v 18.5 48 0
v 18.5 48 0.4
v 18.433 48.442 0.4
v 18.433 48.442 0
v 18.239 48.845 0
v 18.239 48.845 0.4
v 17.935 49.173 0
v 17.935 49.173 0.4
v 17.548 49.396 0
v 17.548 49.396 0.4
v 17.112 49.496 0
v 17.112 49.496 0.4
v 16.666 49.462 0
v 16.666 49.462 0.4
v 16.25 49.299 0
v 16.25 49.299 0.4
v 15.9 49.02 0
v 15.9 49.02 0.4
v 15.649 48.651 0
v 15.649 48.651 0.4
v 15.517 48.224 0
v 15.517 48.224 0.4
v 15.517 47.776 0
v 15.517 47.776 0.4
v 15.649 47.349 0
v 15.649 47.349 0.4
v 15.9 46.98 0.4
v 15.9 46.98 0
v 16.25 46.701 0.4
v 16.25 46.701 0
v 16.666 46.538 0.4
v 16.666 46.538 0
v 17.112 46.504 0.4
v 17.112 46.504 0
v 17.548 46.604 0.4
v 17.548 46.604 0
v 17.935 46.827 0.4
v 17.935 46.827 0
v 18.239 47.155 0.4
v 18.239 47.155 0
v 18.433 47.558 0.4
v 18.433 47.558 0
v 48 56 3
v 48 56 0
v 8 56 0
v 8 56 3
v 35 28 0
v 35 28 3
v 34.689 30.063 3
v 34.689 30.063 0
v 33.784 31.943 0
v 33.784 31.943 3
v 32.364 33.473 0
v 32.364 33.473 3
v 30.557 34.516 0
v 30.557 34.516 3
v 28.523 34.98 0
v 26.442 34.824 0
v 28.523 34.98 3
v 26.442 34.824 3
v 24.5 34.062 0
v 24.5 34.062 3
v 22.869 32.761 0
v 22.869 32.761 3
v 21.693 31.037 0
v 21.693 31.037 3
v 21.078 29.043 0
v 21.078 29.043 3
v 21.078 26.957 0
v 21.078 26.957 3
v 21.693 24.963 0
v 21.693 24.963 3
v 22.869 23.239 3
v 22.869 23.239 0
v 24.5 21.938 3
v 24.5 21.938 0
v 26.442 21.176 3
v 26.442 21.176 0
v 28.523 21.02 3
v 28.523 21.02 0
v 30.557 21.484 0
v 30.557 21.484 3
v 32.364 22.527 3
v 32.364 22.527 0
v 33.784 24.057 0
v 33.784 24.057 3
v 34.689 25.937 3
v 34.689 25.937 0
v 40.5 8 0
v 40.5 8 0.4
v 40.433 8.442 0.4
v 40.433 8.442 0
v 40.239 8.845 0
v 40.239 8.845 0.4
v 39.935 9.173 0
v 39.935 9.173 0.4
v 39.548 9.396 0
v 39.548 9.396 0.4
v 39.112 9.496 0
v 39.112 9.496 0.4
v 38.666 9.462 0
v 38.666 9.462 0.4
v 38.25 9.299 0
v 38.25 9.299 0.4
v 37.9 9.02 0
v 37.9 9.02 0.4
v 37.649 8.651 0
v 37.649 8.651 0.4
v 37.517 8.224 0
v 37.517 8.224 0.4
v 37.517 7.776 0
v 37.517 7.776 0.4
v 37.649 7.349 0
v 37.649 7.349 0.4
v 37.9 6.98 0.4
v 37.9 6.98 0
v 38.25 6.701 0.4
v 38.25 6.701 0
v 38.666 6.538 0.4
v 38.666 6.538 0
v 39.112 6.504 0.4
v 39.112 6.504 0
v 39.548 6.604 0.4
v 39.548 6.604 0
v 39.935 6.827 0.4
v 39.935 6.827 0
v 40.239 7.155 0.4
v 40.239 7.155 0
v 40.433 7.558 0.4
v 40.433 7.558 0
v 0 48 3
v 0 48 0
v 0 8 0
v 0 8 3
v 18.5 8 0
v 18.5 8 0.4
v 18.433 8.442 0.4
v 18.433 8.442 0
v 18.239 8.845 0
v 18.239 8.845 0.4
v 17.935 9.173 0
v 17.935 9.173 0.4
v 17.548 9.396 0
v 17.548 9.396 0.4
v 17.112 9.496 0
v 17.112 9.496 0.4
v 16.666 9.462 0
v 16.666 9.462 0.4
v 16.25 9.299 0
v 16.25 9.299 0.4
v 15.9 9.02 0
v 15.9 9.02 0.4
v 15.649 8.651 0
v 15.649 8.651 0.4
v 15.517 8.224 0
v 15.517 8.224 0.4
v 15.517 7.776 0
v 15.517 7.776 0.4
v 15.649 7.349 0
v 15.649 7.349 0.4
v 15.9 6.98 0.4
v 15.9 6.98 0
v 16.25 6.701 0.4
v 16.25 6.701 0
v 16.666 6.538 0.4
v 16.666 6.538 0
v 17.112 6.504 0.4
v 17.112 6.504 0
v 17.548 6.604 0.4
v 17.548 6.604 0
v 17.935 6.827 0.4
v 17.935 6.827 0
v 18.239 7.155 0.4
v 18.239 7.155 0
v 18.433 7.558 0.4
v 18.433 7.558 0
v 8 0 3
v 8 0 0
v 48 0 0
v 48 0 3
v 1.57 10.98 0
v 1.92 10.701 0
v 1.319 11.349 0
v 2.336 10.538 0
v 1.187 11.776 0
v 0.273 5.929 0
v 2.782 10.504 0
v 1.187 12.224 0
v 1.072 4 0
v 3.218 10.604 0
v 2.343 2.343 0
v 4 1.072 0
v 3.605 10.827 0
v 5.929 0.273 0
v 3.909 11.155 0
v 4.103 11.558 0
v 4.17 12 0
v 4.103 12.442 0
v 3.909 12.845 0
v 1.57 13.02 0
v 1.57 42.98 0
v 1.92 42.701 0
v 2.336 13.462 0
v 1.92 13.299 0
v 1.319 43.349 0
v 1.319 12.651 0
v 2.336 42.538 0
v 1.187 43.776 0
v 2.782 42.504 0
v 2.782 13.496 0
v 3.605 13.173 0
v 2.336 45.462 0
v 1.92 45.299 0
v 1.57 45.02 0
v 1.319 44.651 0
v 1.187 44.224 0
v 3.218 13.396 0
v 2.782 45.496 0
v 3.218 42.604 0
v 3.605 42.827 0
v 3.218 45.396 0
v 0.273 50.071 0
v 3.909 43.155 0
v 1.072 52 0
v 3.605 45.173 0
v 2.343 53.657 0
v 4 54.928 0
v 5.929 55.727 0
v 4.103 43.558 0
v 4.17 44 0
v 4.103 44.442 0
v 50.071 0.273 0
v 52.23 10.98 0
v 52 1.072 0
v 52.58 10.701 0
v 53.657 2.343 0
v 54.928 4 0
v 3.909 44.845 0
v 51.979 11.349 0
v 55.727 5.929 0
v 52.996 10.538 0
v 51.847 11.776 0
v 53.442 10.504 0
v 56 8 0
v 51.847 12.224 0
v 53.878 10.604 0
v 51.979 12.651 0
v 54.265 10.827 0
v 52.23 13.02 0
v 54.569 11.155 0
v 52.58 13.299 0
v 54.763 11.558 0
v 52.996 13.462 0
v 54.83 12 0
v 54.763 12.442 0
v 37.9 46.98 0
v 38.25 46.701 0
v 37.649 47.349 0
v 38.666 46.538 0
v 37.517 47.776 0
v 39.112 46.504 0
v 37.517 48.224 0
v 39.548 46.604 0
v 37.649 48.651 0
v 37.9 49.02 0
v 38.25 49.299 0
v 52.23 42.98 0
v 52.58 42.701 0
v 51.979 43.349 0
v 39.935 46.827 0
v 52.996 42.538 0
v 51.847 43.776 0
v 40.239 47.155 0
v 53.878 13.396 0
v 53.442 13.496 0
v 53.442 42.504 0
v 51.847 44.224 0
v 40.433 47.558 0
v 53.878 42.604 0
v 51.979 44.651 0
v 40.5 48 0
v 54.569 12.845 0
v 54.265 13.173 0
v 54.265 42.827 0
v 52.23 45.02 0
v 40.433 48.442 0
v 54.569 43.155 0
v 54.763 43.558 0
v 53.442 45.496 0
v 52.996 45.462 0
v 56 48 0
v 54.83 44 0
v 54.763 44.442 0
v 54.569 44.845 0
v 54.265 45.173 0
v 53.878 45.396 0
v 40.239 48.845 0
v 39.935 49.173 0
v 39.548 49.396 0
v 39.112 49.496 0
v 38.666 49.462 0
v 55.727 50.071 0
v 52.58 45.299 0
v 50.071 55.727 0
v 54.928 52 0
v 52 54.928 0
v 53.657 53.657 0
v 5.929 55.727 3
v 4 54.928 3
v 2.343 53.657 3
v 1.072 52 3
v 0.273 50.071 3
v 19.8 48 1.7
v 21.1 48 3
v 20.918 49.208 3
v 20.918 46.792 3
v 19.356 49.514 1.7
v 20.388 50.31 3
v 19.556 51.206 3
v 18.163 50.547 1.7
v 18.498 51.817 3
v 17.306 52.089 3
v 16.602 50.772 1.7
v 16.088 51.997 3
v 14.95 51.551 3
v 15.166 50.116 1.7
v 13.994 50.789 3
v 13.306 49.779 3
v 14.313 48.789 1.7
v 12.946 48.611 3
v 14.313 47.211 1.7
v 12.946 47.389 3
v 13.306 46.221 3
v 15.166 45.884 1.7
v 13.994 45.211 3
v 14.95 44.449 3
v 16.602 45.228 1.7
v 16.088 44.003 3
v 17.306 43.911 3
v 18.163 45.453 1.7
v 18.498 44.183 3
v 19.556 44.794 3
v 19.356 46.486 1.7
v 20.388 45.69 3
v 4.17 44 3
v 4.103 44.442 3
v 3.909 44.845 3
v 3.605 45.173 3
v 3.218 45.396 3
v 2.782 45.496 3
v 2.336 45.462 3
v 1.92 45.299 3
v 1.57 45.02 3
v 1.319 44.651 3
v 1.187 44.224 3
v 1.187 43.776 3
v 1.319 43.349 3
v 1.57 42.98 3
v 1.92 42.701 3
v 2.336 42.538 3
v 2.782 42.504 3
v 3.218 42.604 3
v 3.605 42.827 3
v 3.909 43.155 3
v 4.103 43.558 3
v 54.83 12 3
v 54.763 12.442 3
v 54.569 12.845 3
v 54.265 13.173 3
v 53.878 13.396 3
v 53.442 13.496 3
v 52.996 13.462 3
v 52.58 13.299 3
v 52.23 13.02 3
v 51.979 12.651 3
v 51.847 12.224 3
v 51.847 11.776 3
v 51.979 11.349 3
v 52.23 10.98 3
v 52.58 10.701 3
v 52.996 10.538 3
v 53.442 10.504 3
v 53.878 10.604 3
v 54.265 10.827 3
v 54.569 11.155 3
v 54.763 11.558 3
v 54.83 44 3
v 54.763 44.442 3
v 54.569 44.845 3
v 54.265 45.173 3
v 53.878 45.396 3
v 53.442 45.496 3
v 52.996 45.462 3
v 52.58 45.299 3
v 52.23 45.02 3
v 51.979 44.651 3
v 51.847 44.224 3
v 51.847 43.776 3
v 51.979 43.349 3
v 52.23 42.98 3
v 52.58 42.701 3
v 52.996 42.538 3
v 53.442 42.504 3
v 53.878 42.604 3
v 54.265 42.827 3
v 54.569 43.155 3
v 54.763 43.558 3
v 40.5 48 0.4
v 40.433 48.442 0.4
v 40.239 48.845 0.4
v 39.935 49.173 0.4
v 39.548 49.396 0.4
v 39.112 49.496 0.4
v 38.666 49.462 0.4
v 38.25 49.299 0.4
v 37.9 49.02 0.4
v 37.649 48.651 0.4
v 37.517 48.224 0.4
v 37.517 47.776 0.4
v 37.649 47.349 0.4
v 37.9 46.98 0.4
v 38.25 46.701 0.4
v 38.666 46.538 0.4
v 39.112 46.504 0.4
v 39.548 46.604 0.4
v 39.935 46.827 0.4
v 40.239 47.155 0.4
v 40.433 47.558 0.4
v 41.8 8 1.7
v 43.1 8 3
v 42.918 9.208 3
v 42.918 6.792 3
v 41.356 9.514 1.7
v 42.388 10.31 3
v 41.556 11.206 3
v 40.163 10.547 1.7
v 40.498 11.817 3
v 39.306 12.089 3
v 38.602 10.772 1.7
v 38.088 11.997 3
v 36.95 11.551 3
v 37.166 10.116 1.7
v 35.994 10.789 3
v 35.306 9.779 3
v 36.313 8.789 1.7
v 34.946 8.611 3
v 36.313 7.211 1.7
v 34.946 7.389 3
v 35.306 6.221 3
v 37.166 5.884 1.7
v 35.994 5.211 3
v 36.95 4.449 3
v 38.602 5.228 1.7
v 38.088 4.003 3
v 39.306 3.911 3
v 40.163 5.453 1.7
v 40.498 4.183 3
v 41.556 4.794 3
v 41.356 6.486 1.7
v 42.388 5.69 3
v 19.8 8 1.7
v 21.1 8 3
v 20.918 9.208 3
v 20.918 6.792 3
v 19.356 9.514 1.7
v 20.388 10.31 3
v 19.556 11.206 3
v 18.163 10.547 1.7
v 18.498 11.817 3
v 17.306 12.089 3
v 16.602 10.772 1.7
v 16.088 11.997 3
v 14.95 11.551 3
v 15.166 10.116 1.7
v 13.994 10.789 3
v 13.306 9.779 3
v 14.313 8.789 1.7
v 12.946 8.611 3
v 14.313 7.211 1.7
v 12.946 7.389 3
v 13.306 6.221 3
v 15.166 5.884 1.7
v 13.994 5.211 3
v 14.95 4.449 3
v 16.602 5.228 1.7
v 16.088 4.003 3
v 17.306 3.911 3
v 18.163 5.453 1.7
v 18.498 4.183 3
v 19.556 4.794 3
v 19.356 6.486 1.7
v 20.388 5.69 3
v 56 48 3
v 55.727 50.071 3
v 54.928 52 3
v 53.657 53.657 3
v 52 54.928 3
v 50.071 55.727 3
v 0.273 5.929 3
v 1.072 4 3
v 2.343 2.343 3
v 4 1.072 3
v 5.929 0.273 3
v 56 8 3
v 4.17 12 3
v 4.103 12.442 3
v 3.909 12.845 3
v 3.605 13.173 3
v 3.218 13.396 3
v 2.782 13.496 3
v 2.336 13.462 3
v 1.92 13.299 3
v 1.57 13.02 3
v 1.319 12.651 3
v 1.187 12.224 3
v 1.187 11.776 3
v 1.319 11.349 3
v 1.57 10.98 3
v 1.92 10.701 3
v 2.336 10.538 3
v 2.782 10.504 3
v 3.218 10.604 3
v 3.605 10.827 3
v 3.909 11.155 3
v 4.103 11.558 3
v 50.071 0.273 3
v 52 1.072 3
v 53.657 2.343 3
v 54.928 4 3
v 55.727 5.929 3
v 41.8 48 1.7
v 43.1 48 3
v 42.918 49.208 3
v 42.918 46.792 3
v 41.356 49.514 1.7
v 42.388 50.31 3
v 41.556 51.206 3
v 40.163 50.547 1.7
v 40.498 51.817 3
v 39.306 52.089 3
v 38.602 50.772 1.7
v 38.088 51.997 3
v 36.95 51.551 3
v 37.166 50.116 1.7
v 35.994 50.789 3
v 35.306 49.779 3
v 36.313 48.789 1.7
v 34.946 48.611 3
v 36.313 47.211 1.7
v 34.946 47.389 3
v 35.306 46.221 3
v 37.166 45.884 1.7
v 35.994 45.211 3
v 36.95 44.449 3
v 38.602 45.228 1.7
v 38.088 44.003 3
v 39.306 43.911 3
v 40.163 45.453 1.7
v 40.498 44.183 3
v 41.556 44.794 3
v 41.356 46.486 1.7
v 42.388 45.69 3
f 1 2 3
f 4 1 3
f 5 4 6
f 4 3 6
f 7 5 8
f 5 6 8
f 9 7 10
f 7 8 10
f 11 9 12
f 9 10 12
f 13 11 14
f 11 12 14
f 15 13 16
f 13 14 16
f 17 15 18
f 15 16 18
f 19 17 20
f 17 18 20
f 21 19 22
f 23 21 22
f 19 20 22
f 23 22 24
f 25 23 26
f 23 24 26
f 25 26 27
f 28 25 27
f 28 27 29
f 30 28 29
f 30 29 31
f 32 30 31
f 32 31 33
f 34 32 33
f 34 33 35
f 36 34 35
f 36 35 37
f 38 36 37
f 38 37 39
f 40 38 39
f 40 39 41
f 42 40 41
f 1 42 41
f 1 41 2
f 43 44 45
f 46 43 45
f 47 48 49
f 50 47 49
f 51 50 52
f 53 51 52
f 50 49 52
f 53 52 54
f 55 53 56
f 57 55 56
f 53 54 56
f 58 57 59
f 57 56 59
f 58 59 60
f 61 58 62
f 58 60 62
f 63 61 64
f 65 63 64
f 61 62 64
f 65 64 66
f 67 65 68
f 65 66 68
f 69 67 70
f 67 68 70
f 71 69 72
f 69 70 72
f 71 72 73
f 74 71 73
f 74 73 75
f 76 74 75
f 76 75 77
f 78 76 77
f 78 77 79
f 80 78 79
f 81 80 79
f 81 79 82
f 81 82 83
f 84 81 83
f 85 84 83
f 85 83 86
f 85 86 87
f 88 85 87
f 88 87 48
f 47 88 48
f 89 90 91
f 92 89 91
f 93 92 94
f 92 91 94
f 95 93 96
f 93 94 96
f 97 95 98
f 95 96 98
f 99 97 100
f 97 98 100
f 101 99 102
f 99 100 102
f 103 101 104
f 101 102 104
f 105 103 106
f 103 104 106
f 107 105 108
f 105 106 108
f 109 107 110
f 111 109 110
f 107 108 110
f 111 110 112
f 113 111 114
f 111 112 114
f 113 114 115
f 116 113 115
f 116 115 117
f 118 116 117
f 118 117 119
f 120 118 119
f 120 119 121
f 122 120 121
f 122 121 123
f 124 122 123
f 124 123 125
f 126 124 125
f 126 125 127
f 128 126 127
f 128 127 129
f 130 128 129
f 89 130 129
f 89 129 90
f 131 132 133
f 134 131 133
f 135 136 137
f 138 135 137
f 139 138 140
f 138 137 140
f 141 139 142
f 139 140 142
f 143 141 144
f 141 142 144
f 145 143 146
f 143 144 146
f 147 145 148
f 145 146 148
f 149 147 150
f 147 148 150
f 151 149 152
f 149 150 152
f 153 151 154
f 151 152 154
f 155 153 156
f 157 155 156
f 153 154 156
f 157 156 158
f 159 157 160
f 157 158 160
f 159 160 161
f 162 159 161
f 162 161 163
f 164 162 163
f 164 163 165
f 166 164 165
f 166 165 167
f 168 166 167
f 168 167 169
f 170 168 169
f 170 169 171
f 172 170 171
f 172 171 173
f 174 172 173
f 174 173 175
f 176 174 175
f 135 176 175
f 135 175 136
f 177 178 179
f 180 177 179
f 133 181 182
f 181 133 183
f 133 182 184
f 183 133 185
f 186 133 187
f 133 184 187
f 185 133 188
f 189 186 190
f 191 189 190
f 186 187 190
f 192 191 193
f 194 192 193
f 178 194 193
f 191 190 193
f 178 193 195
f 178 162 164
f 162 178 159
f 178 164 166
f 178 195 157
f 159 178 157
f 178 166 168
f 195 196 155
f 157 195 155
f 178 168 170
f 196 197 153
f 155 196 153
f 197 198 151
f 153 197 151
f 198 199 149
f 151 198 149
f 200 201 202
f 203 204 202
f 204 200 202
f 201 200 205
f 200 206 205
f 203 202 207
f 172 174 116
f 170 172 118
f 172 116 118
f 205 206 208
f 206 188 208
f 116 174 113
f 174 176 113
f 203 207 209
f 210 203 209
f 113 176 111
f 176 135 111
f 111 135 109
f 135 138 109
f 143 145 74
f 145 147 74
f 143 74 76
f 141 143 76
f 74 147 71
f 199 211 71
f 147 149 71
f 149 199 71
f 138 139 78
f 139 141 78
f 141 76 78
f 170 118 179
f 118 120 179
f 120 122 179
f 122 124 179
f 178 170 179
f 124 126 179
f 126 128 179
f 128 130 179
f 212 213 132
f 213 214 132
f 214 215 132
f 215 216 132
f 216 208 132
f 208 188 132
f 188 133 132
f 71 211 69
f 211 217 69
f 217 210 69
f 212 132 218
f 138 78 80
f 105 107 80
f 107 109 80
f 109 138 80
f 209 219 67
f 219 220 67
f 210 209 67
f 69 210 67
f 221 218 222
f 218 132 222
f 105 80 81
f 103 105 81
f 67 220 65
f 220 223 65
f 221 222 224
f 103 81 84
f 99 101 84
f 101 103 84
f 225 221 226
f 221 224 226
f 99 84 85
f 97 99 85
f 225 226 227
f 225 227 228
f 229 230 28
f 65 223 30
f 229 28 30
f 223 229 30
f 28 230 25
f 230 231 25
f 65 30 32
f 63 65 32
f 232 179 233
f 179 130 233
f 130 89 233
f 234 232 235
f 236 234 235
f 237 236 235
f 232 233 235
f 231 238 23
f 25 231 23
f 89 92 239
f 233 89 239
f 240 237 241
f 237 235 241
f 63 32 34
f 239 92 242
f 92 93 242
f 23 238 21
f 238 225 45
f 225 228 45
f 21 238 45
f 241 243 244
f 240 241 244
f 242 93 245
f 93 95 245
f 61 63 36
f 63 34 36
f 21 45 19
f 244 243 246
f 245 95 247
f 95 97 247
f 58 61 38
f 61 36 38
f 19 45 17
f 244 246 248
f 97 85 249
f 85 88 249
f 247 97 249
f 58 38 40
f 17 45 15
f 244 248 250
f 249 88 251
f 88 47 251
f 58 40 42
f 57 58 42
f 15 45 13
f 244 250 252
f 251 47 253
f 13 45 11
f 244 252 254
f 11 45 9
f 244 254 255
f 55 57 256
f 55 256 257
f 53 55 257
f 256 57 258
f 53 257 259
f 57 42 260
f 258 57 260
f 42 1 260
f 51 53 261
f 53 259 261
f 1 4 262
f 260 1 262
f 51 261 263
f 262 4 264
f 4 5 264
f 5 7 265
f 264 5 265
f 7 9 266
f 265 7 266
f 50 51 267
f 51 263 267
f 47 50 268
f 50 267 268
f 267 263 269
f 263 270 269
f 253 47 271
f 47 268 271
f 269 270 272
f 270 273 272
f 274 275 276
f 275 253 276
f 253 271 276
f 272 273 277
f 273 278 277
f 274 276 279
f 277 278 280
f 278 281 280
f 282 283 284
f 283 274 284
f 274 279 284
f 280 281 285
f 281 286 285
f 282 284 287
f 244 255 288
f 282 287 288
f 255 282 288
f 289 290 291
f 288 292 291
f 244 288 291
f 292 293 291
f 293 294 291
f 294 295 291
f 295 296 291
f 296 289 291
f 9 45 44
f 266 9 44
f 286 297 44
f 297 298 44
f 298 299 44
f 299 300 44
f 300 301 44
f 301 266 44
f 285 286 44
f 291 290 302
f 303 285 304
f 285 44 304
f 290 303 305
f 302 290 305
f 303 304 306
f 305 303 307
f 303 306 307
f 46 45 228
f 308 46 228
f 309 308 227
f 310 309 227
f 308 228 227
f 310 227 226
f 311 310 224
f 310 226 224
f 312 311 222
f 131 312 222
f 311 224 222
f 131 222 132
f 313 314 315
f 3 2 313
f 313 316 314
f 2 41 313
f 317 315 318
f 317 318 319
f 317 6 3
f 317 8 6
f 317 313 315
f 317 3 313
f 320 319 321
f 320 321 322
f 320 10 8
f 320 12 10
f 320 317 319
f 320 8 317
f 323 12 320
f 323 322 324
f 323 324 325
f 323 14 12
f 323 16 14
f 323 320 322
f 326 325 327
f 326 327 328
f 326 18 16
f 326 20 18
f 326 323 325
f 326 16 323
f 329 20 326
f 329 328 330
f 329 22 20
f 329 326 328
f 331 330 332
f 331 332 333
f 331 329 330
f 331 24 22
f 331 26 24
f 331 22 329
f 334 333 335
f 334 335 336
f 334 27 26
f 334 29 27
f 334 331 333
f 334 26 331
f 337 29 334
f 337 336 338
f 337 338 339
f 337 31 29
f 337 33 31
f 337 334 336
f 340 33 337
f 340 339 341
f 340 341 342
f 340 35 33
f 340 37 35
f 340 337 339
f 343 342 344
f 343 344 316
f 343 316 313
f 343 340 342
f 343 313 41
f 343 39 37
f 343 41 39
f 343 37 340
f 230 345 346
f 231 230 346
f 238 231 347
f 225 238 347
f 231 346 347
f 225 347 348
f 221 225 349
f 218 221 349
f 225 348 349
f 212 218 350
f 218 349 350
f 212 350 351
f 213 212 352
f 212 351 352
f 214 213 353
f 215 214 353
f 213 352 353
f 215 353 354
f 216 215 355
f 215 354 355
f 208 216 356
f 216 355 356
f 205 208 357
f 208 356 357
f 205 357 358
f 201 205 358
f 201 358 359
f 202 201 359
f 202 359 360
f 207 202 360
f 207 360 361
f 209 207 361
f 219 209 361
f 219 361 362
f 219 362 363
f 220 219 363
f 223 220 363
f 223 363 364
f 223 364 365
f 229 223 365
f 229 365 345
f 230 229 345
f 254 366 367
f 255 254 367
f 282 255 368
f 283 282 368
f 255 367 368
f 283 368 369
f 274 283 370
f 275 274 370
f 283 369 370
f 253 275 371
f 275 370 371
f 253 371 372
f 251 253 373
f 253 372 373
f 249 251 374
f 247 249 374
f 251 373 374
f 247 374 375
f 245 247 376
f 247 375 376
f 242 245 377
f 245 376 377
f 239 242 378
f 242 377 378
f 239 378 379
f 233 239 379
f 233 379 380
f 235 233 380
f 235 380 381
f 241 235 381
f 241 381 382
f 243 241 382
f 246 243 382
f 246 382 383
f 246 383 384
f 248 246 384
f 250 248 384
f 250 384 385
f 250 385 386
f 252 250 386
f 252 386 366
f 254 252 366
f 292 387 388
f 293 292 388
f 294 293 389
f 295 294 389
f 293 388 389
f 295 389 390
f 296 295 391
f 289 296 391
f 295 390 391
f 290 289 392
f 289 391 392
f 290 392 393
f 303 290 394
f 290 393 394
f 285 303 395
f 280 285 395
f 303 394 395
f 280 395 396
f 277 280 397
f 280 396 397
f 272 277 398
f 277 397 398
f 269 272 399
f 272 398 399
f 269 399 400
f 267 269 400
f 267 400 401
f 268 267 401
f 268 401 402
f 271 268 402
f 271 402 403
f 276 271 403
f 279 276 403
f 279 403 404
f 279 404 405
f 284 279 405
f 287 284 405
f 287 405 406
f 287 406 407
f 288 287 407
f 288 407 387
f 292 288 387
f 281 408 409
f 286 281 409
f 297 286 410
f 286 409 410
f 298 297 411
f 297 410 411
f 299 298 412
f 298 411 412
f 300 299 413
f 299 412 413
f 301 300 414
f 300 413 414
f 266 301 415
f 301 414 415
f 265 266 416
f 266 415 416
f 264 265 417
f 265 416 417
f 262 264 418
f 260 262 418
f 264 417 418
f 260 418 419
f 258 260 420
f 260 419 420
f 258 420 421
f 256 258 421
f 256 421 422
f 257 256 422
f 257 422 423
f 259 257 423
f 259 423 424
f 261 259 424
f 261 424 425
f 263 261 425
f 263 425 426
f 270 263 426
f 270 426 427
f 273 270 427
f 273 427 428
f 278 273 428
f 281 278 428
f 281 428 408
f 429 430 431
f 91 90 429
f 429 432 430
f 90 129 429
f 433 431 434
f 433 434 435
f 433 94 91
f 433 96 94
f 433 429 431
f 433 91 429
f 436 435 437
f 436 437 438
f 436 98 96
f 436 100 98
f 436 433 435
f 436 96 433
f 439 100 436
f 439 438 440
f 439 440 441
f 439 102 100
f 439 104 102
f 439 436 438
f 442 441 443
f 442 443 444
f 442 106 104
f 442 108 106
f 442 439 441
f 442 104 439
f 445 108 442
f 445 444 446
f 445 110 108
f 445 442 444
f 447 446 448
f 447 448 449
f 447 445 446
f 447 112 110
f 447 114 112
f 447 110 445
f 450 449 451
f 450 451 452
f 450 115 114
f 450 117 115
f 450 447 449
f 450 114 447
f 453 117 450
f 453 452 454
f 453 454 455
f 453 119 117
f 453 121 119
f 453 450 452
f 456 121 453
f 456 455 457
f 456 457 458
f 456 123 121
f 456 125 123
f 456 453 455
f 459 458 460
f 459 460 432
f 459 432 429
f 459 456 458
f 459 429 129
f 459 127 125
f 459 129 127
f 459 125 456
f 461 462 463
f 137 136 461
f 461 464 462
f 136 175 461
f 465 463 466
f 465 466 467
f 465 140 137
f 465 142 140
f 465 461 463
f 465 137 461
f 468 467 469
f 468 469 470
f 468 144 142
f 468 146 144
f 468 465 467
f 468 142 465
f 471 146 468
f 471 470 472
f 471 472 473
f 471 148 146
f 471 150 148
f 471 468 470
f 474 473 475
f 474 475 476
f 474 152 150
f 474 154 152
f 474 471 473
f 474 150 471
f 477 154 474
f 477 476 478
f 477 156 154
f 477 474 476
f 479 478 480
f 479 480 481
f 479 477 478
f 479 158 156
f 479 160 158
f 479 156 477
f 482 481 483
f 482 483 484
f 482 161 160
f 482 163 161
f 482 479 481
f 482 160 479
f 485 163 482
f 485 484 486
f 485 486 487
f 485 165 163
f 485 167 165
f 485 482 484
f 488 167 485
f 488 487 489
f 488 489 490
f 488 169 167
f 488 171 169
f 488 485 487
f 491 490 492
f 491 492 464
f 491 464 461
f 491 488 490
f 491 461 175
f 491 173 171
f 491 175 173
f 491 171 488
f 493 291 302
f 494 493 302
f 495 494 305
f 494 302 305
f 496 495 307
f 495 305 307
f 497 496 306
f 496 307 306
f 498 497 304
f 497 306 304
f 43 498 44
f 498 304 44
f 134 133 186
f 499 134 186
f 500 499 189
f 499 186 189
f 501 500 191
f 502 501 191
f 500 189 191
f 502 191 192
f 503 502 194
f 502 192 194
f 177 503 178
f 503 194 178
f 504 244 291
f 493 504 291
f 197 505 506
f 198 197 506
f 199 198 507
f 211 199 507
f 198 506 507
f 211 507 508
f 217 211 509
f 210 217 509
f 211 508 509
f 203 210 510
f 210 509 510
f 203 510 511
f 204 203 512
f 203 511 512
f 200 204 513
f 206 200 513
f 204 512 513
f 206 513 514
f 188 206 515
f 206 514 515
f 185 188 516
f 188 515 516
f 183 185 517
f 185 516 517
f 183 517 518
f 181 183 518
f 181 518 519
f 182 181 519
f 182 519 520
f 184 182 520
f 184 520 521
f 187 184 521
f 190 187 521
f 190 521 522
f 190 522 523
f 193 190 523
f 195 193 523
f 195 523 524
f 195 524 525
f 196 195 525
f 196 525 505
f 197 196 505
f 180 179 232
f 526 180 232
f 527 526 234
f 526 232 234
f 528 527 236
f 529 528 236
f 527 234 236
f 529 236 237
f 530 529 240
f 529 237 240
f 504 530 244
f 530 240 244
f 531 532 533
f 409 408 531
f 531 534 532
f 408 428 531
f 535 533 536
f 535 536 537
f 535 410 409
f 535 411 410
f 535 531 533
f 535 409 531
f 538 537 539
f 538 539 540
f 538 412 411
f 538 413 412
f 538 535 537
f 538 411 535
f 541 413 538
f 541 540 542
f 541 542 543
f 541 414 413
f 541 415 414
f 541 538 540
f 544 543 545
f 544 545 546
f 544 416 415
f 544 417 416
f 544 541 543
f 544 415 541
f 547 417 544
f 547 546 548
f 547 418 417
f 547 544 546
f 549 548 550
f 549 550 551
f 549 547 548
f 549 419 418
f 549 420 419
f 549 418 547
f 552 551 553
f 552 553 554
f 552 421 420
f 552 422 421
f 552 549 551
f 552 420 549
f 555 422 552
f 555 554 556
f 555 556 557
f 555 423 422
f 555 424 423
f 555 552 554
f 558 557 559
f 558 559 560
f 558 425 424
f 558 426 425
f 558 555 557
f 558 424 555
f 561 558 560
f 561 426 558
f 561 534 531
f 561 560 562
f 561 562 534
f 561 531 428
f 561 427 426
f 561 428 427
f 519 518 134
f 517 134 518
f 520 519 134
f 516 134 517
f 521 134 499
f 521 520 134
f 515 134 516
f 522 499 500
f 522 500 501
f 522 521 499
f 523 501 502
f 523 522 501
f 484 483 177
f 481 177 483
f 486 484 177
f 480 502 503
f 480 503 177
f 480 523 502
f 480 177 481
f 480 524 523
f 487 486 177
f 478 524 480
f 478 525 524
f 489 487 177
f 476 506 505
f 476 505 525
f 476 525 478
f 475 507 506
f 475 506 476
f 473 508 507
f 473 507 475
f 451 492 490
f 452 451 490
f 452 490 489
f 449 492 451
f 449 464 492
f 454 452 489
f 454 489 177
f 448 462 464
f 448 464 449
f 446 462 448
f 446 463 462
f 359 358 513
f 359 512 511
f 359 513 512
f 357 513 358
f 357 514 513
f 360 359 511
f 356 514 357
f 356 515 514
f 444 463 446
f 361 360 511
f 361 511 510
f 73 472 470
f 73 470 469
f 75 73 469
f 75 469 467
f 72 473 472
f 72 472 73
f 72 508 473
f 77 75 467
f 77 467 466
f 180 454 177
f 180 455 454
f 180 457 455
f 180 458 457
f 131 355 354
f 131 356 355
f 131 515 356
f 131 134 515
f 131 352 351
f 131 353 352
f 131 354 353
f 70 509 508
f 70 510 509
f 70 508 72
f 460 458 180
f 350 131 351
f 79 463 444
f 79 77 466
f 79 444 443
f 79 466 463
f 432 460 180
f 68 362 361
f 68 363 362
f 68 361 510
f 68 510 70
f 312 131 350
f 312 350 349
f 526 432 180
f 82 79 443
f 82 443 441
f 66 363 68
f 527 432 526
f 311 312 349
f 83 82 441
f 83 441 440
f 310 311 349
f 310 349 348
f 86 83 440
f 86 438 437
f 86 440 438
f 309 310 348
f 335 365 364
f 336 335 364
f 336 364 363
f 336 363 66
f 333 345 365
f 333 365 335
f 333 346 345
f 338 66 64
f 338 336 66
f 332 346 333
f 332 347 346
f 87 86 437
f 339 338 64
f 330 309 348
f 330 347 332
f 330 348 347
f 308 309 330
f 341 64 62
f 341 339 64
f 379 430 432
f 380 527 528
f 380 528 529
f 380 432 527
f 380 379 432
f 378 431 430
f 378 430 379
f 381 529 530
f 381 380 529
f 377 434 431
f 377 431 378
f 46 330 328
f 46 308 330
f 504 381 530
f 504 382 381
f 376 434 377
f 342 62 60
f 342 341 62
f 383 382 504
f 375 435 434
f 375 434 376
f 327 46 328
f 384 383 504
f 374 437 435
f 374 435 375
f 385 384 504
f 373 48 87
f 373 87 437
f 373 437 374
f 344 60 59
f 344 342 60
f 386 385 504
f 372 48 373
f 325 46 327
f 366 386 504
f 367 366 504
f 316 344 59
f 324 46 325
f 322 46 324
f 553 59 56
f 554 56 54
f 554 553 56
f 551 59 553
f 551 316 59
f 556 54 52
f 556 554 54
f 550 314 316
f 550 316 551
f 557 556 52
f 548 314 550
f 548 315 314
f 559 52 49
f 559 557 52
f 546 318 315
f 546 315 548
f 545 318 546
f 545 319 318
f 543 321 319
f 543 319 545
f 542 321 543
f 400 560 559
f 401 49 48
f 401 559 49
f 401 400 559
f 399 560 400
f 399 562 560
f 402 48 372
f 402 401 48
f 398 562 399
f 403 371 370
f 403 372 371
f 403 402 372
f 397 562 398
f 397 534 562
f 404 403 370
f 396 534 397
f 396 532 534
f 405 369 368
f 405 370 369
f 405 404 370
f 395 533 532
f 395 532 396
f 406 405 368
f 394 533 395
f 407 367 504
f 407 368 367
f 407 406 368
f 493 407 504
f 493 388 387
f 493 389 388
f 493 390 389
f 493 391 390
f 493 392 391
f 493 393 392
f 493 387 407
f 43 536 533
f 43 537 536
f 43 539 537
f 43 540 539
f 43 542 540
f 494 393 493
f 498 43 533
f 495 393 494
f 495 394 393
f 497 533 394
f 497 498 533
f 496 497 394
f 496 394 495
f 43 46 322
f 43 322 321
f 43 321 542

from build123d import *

# Parameters (mm, degrees)
EXTRUDE_1_DEPTH     = 3
SKETCH_2_R          = 7
CUT_EXTRUDE_1_DEPTH = 80.252760204
SKETCH_3_R          = 1.5
CUT_EXTRUDE_2_DEPTH = 80.252760204
SKETCH_4_R          = 1.5
CUT_EXTRUDE_3_DEPTH = 80.252760204
CHAMFER_1_SIZE      = 2.6


with BuildPart() as part:
    # Эскиз1 → Бобышка-Вытянуть1 (new body)
    with BuildSketch(Plane.XY):
        with BuildLine():
            Line((8, 0), (48, 0))
            ThreePointArc((48, 0), (53.656854249, 2.343145751), (56, 8))
            Line((56, 8), (56, 48))
            ThreePointArc((56, 48), (53.656854249, 53.656854249), (48, 56))
            Line((48, 56), (8, 56))
            ThreePointArc((8, 56), (2.343145751, 53.656854249), (0, 48))
            Line((0, 48), (0, 8))
            ThreePointArc((0, 8), (2.343145751, 2.343145751), (8, 0))
        make_face()
    extrude(amount=EXTRUDE_1_DEPTH)

    # Эскиз2 → Вырез-Вытянуть1 (cut, through all)
    with BuildSketch(Plane.XY.offset(3)):
        with Locations((28, 28)):
            Circle(SKETCH_2_R)
    extrude(amount=-CUT_EXTRUDE_1_DEPTH, mode=Mode.SUBTRACT)

    # Эскиз3 → Вырез-Вытянуть2 (cut, through all)
    with BuildSketch(Plane.XY.offset(3)):
        with Locations((2.67, 12)):
            Circle(SKETCH_3_R)
        with Locations((53.33, 12)):
            Circle(SKETCH_3_R)
        with Locations((53.33, 44)):
            Circle(SKETCH_3_R)
        with Locations((2.67, 44)):
            Circle(SKETCH_3_R)
    extrude(amount=-CUT_EXTRUDE_2_DEPTH, mode=Mode.SUBTRACT)

    # Эскиз4 → Вырез-Вытянуть3 (cut, through all)
    with BuildSketch(Plane.XY.offset(3)):
        with Locations((17, 8)):
            Circle(SKETCH_4_R)
        with Locations((39, 8)):
            Circle(SKETCH_4_R)
        with Locations((39, 48)):
            Circle(SKETCH_4_R)
        with Locations((17, 48)):
            Circle(SKETCH_4_R)
    extrude(amount=-CUT_EXTRUDE_3_DEPTH, mode=Mode.SUBTRACT)

    # Фаска1
    chamfer_1_edges = [part.edges().sort_by_distance(p)[0] for p in [
        (15.5, 48, 3),
        (37.5, 48, 3),
        (37.5, 8, 3),
        (15.5, 8, 3),
    ]]
    chamfer(chamfer_1_edges, length=CHAMFER_1_SIZE)


solid = part.part
